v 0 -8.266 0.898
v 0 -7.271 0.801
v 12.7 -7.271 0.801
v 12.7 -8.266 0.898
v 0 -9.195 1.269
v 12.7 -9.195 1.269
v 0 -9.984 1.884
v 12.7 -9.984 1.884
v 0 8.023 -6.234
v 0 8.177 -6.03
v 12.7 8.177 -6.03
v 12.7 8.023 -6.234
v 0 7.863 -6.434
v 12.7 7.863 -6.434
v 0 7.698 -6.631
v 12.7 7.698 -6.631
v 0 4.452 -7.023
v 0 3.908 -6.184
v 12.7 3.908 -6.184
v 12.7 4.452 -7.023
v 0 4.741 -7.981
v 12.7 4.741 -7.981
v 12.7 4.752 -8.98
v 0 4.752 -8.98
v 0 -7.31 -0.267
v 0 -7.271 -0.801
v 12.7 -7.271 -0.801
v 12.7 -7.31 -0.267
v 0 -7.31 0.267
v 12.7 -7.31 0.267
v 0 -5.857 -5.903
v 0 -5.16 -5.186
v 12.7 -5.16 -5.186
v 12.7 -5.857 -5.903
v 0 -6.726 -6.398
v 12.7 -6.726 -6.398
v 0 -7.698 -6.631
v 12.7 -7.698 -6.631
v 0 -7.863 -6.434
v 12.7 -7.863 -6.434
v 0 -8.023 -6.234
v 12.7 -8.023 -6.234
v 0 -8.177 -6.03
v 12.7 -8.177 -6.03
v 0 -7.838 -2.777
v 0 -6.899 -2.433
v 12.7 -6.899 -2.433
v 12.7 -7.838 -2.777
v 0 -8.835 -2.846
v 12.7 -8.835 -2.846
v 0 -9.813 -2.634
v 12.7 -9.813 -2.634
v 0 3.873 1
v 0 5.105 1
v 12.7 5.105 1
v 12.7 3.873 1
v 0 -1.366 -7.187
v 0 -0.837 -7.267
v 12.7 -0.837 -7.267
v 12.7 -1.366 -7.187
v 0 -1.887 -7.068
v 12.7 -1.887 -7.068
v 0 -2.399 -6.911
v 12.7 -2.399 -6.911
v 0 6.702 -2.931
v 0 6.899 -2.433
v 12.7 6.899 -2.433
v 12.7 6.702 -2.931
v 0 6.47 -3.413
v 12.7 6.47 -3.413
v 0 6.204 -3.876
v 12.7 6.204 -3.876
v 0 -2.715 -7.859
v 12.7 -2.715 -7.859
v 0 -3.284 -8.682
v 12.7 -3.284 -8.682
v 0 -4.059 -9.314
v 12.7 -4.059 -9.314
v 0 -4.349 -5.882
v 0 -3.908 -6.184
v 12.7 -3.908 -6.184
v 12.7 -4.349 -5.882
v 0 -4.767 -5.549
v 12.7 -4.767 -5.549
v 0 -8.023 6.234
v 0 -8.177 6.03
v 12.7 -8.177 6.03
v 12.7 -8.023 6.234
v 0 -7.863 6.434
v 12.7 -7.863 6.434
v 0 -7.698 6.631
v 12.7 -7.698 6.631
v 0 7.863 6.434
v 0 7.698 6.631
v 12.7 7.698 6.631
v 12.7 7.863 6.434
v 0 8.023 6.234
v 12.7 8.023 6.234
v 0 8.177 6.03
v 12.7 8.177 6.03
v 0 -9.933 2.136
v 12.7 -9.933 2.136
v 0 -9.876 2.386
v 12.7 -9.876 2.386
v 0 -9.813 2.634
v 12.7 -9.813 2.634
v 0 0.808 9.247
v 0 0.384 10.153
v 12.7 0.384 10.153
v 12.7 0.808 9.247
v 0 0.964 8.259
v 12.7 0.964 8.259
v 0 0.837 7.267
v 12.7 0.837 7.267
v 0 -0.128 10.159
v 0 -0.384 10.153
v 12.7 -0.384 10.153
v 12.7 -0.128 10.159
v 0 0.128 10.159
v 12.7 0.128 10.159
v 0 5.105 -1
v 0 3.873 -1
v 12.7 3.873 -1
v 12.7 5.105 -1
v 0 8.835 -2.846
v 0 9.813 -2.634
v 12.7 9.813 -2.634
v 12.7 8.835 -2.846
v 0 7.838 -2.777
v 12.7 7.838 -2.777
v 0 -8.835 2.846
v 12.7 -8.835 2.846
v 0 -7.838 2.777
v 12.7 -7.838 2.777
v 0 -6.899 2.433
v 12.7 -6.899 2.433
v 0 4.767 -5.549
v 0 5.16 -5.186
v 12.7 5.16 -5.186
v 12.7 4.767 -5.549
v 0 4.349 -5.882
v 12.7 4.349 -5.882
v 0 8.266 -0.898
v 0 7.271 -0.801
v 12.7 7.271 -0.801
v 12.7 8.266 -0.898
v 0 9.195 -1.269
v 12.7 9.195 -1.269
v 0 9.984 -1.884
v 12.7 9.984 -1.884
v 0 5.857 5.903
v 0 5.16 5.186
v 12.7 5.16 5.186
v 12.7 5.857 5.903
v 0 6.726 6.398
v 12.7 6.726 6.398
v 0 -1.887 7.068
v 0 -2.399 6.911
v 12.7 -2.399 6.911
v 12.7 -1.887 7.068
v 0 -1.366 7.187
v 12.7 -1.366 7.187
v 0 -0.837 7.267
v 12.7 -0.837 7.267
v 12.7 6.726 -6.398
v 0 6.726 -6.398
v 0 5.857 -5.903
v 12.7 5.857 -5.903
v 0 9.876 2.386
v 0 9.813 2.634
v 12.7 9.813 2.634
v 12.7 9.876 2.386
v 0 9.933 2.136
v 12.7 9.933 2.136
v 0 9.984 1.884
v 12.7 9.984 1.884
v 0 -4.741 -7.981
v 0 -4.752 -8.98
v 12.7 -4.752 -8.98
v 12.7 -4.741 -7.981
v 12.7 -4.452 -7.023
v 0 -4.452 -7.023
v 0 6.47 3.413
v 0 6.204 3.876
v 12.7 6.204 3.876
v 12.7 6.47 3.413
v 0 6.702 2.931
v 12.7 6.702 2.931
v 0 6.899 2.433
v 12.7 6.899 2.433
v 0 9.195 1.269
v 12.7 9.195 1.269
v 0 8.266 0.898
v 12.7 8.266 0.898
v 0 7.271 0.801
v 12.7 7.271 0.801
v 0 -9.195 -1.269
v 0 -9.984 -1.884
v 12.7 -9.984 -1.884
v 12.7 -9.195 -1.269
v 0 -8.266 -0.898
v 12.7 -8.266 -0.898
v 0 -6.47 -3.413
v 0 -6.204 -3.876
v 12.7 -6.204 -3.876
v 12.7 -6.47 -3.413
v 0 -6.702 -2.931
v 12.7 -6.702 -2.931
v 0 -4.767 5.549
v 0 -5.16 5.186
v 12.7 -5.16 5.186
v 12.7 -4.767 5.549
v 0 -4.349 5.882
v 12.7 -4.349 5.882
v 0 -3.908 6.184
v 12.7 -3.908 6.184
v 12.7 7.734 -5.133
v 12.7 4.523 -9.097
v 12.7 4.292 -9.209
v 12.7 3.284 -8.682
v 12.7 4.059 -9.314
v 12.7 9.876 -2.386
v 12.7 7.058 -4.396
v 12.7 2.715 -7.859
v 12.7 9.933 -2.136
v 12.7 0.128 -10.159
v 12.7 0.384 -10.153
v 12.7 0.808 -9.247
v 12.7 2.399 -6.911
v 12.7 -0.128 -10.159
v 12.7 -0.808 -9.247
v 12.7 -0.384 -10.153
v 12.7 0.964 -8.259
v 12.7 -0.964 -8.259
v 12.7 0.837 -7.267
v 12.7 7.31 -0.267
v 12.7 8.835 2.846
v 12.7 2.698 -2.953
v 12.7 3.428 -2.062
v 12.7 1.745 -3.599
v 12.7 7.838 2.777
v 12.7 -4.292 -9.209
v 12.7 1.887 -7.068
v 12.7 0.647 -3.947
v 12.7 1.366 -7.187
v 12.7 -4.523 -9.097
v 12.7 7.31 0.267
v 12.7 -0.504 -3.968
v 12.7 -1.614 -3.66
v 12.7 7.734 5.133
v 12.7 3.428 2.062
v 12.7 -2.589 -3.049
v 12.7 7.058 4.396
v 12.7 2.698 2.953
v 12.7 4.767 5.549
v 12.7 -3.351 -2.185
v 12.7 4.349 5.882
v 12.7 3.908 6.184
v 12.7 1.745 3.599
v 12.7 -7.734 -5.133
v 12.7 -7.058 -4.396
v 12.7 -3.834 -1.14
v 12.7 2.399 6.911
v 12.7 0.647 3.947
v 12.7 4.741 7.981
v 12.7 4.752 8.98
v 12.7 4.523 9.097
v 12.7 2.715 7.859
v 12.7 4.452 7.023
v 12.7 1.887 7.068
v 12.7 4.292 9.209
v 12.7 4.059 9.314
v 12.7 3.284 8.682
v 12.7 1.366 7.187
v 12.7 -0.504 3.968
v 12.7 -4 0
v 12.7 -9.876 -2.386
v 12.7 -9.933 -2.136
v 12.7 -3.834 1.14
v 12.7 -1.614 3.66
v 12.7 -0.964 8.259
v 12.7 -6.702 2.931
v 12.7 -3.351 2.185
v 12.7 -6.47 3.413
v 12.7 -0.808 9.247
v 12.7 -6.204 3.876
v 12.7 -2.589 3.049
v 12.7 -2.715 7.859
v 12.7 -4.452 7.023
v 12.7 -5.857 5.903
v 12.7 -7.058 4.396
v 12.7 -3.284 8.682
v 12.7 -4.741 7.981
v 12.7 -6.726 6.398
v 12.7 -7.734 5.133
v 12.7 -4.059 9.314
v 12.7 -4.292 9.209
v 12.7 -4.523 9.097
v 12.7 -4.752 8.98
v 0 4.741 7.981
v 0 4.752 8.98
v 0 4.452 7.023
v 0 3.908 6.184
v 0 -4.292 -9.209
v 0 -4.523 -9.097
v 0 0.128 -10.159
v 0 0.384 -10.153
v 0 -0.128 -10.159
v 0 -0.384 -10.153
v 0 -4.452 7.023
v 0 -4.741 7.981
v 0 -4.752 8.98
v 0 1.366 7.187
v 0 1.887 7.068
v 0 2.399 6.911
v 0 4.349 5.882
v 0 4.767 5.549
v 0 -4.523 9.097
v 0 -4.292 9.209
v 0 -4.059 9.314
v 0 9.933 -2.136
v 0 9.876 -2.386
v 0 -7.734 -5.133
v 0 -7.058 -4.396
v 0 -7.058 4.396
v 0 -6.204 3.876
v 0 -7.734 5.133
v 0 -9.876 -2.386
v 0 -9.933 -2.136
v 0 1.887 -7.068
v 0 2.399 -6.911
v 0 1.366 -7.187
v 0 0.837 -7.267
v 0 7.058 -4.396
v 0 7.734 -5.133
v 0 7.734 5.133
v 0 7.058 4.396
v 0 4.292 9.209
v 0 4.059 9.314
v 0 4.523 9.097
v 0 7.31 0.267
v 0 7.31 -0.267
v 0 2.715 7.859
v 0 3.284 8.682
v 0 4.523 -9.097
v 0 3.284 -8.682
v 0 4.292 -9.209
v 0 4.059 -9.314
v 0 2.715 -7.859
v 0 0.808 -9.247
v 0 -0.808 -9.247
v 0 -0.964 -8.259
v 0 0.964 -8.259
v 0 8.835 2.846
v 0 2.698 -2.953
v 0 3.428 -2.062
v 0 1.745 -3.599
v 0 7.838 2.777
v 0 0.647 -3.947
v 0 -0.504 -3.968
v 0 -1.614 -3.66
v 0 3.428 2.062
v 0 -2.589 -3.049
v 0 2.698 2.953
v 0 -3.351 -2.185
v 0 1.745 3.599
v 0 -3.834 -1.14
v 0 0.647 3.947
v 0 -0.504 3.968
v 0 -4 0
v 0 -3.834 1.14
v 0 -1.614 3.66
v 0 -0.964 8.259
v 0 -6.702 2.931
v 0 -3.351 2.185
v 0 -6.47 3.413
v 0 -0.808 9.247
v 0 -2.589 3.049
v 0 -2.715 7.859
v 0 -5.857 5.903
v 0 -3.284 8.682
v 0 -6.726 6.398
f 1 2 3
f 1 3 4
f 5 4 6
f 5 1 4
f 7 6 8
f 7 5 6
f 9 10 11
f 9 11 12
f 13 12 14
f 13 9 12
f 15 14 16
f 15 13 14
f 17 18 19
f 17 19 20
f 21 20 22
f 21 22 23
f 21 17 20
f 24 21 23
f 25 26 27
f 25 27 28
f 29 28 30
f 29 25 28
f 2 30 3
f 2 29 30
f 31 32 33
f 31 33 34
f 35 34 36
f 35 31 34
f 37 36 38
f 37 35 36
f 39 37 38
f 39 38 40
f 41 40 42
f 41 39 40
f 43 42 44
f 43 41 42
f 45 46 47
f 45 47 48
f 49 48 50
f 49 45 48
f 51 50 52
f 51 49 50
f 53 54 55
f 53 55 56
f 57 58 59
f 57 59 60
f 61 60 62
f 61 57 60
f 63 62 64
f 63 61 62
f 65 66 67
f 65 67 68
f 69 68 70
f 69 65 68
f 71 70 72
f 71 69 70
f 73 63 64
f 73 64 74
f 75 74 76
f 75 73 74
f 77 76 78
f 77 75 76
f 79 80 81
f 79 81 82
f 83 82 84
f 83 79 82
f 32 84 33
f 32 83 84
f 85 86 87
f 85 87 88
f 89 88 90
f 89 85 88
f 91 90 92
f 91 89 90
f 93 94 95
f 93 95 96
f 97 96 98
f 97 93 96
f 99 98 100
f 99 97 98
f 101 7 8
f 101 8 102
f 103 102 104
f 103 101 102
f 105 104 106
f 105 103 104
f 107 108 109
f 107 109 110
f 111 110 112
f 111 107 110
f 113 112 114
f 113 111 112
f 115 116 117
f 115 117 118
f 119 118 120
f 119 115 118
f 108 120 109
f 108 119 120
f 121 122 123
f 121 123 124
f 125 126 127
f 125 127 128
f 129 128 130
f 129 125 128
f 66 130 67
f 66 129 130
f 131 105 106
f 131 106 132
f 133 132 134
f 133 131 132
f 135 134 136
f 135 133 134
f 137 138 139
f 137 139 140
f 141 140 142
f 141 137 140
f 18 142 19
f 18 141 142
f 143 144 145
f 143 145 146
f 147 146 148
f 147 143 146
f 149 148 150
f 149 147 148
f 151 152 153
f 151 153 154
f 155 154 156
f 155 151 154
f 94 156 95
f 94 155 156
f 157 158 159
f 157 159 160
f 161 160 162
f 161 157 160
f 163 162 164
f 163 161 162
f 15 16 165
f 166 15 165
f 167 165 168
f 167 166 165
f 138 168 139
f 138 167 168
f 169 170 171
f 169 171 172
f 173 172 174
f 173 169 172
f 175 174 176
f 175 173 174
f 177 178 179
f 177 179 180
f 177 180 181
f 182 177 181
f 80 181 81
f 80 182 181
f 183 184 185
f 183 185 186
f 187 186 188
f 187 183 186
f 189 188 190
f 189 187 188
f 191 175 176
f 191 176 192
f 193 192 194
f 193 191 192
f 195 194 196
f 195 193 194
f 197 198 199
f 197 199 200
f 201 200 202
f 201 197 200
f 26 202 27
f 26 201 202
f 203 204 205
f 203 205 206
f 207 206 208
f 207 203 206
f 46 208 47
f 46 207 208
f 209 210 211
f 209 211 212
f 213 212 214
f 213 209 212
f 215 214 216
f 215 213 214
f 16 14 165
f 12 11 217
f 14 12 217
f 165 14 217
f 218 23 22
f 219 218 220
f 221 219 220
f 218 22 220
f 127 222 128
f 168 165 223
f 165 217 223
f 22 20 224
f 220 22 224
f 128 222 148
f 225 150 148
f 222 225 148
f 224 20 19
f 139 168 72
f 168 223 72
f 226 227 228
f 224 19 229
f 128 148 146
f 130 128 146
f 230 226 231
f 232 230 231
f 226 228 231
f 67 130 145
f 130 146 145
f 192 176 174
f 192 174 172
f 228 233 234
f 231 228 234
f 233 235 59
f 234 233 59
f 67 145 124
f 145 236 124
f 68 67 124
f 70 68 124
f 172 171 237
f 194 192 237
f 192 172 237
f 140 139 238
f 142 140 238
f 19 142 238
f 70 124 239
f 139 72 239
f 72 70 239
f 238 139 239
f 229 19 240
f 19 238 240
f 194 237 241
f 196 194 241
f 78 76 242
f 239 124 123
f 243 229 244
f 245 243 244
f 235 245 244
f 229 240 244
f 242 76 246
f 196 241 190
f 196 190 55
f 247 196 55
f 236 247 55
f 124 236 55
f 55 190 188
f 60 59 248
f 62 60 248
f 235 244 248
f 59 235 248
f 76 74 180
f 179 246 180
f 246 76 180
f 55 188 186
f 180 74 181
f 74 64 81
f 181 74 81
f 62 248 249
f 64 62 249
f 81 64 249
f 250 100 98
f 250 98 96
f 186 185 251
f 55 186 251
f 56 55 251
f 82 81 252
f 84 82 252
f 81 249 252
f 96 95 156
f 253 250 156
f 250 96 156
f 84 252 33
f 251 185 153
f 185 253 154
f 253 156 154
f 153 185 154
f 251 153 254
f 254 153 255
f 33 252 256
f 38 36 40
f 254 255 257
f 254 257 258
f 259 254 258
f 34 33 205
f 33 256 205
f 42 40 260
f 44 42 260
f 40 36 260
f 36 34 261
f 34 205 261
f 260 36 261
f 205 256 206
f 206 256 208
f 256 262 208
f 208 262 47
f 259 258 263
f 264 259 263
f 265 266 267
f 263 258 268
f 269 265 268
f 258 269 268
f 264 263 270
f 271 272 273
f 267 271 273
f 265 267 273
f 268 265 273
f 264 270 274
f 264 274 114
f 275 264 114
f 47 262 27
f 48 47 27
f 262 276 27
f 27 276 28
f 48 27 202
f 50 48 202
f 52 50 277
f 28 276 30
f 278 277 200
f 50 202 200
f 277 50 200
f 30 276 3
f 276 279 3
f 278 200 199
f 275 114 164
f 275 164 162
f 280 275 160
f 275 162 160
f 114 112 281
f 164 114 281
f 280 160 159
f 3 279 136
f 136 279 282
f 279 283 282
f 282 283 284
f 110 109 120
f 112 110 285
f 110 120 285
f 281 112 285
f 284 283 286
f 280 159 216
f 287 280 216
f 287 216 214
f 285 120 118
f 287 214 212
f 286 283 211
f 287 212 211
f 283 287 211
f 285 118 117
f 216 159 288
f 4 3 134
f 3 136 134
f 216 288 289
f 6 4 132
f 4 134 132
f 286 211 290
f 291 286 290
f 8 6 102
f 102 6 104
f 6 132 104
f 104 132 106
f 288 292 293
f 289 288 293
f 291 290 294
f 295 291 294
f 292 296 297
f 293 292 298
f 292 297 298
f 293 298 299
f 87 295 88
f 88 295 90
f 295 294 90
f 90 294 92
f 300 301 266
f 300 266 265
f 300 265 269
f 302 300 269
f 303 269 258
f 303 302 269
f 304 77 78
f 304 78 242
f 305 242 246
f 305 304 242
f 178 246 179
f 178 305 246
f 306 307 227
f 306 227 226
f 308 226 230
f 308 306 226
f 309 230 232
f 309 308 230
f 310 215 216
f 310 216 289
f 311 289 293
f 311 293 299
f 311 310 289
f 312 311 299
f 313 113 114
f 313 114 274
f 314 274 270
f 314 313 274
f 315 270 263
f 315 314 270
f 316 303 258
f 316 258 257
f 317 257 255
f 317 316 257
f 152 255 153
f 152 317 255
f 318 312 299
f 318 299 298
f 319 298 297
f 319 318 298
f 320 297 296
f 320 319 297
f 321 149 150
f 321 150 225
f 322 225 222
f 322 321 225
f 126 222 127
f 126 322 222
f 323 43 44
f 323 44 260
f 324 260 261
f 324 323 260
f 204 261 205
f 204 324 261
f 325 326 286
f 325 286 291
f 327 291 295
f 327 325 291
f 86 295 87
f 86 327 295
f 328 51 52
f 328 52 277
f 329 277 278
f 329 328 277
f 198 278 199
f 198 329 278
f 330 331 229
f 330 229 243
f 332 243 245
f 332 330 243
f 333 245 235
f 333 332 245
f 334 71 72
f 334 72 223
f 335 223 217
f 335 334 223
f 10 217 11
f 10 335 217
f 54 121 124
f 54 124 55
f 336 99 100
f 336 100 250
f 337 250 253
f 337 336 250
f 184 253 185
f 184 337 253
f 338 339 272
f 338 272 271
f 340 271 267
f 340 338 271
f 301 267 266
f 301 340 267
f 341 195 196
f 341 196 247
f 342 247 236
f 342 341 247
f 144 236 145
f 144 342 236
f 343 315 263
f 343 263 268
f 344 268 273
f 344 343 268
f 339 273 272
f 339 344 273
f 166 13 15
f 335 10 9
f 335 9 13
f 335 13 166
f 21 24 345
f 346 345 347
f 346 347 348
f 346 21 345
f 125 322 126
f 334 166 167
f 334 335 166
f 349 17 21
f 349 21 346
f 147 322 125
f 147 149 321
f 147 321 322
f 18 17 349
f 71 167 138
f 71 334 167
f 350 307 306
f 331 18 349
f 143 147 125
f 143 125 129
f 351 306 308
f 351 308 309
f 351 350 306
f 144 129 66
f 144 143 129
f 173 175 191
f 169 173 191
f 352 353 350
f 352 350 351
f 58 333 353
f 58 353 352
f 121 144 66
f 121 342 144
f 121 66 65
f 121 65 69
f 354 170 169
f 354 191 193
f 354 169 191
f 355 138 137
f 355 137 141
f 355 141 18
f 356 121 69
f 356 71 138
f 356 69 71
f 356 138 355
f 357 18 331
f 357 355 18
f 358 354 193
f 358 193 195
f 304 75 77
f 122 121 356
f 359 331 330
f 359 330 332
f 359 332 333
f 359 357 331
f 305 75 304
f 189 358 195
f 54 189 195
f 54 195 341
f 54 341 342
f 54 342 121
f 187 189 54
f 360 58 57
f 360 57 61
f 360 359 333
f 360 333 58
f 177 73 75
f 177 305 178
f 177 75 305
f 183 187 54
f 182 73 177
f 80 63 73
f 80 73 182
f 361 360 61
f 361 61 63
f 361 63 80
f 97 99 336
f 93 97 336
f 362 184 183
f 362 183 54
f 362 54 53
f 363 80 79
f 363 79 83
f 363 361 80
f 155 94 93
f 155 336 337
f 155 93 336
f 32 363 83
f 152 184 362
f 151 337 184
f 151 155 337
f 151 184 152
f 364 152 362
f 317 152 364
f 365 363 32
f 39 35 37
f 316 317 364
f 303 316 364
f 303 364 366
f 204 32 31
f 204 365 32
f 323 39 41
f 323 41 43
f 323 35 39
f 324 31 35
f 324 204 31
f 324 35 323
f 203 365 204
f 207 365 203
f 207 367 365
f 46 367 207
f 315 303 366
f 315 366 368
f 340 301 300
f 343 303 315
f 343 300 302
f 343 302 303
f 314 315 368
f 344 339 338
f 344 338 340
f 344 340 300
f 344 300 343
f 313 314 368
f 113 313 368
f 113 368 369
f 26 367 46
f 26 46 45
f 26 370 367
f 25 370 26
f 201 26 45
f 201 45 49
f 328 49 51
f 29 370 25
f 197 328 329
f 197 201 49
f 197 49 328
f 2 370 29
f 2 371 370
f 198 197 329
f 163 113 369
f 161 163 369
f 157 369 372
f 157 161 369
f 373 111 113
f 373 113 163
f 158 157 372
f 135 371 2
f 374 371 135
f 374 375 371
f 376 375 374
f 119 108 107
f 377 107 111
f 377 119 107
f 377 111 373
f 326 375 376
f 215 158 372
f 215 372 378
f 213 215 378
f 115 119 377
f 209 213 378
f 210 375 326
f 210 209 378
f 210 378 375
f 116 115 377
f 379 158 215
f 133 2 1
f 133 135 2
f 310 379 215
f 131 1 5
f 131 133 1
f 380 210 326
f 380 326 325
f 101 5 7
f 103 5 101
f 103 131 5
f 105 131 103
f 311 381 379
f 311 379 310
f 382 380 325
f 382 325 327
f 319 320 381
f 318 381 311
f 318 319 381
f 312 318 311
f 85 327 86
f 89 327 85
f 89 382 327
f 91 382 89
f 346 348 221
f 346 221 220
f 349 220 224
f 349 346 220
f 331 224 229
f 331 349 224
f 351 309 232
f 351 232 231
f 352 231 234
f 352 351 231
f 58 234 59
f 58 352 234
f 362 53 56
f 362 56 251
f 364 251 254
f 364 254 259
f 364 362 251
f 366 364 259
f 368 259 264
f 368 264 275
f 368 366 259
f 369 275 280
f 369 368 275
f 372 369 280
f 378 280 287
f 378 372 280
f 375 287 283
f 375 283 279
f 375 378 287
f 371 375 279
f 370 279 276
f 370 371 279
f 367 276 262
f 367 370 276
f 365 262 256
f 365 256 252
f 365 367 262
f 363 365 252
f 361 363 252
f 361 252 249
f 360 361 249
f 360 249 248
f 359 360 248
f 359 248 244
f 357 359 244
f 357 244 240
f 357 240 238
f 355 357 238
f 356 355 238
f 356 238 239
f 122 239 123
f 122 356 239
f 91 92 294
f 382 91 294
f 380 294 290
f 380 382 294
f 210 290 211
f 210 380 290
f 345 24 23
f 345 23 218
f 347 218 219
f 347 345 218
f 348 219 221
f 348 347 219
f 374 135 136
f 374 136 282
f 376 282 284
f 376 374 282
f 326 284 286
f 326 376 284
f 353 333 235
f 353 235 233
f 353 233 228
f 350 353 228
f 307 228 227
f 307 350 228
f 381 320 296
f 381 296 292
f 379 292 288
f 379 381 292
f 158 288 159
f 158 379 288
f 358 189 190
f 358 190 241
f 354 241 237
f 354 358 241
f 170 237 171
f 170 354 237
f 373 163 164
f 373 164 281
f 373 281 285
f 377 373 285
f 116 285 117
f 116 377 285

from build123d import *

# Parameters (mm, degrees)
BOSS_EXTRUDE1_DEPTH = 12.7


with BuildPart() as part:
    # Sketch1 → Boss-Extrude1 (new body)
    with BuildSketch(Plane(origin=(0, 0, 0), x_dir=(0, -1, 0), z_dir=(-1, 0, 0))):
        with BuildLine():
            ThreePointArc((-8.177440487, -6.029516323), (-7.943407862, -6.334656387), (-7.697995454, -6.630721377))
            ThreePointArc((-7.697995454, -6.630721377), (-6.273562142, -6.180849316), (-5.15957287, -5.185649317))
            ThreePointArc((-5.15957287, -5.185649317), (-4.560952599, -5.719253661), (-3.907521288, -6.184127135))
            ThreePointArc((-3.907521288, -6.184127135), (-4.629883612, -7.491639203), (-4.75151021, -8.98046495))
            ThreePointArc((-4.75151021, -8.98046495), (-4.408258789, -9.153843698), (-4.058692066, -9.314108584))
            ThreePointArc((-4.058692066, -9.314108584), (-2.970514168, -8.29074941), (-2.398645612, -6.910763363))
            ThreePointArc((-2.398645612, -6.910763363), (-1.627785136, -7.131792663), (-0.837362826, -7.267115971))
            ThreePointArc((-0.837362826, -7.267115971), (-0.920880567, -8.758564905), (-0.384485064, -10.152722356))
            ThreePointArc((-0.384485064, -10.152722356), (0, -10.16), (0.384485064, -10.152722356))
            ThreePointArc((0.384485064, -10.152722356), (0.920880567, -8.758564905), (0.837362826, -7.267115971))
            ThreePointArc((0.837362826, -7.267115971), (1.627785136, -7.131792663), (2.398645612, -6.910763363))
            ThreePointArc((2.398645612, -6.910763363), (2.970514168, -8.29074941), (4.058692066, -9.314108584))
            ThreePointArc((4.058692066, -9.314108584), (4.408258789, -9.153843698), (4.75151021, -8.98046495))
            ThreePointArc((4.75151021, -8.98046495), (4.629883612, -7.491639203), (3.907521288, -6.184127135))
            ThreePointArc((3.907521288, -6.184127135), (4.560952599, -5.719253661), (5.15957287, -5.185649317))
            ThreePointArc((5.15957287, -5.185649317), (6.273562142, -6.180849316), (7.697995454, -6.630721377))
            ThreePointArc((7.697995454, -6.630721377), (7.943407862, -6.334656387), (8.177440487, -6.029516323))
            ThreePointArc((8.177440487, -6.029516323), (7.421881426, -4.740902478), (6.203747236, -3.876296077))
            ThreePointArc((6.203747236, -3.876296077), (6.590767462, -3.173946328), (6.898583443, -2.433453825))
            ThreePointArc((6.898583443, -2.433453825), (8.334054192, -2.846756211), (9.812616434, -2.634038481))
            ThreePointArc((9.812616434, -2.634038481), (9.905267588, -2.260812689), (9.983728385, -1.884348041))
            ThreePointArc((9.983728385, -1.884348041), (8.7438846, -1.051171874), (7.271244959, -0.800717041))
            ThreePointArc((7.271244959, -0.800717041), (7.3152, 0), (7.271244959, 0.800717041))
            ThreePointArc((7.271244959, 0.800717041), (8.7438846, 1.051171874), (9.983728385, 1.884348041))
            ThreePointArc((9.983728385, 1.884348041), (9.905267588, 2.260812689), (9.812616434, 2.634038481))
            ThreePointArc((9.812616434, 2.634038481), (8.334054192, 2.846756211), (6.898583443, 2.433453825))
            ThreePointArc((6.898583443, 2.433453825), (6.590767462, 3.173946328), (6.203747236, 3.876296077))
            ThreePointArc((6.203747236, 3.876296077), (7.421881426, 4.740902478), (8.177440487, 6.029516323))
            ThreePointArc((8.177440487, 6.029516323), (7.943407862, 6.334656387), (7.697995454, 6.630721377))
            ThreePointArc((7.697995454, 6.630721377), (6.273562142, 6.180849316), (5.15957287, 5.185649317))
            ThreePointArc((5.15957287, 5.185649317), (4.560952599, 5.719253661), (3.907521288, 6.184127135))
            ThreePointArc((3.907521288, 6.184127135), (4.629883612, 7.491639203), (4.75151021, 8.98046495))
            ThreePointArc((4.75151021, 8.98046495), (4.408258789, 9.153843698), (4.058692066, 9.314108584))
            ThreePointArc((4.058692066, 9.314108584), (2.970514168, 8.29074941), (2.398645612, 6.910763363))
            ThreePointArc((2.398645612, 6.910763363), (1.627785136, 7.131792663), (0.837362826, 7.267115971))
            ThreePointArc((0.837362826, 7.267115971), (0.920880567, 8.758564905), (0.384485064, 10.152722356))
            ThreePointArc((0.384485064, 10.152722356), (0, 10.16), (-0.384485064, 10.152722356))
            ThreePointArc((-0.384485064, 10.152722356), (-0.920880567, 8.758564905), (-0.837362826, 7.267115971))
            ThreePointArc((-0.837362826, 7.267115971), (-1.627785136, 7.131792663), (-2.398645612, 6.910763363))
            ThreePointArc((-2.398645612, 6.910763363), (-2.970514168, 8.29074941), (-4.058692066, 9.314108584))
            ThreePointArc((-4.058692066, 9.314108584), (-4.408258789, 9.153843698), (-4.75151021, 8.98046495))
            ThreePointArc((-4.75151021, 8.98046495), (-4.629883612, 7.491639203), (-3.907521288, 6.184127135))
            ThreePointArc((-3.907521288, 6.184127135), (-4.560952599, 5.719253661), (-5.15957287, 5.185649317))
            ThreePointArc((-5.15957287, 5.185649317), (-6.273562142, 6.180849316), (-7.697995454, 6.630721377))
            ThreePointArc((-7.697995454, 6.630721377), (-7.943407862, 6.334656387), (-8.177440487, 6.029516323))
            ThreePointArc((-8.177440487, 6.029516323), (-7.421881426, 4.740902478), (-6.203747236, 3.876296077))
            ThreePointArc((-6.203747236, 3.876296077), (-6.590767462, 3.173946328), (-6.898583443, 2.433453825))
            ThreePointArc((-6.898583443, 2.433453825), (-8.334054192, 2.846756211), (-9.812616434, 2.634038481))
            ThreePointArc((-9.812616434, 2.634038481), (-9.905267588, 2.260812689), (-9.983728385, 1.884348041))
            ThreePointArc((-9.983728385, 1.884348041), (-8.7438846, 1.051171874), (-7.271244959, 0.800717041))
            ThreePointArc((-7.271244959, 0.800717041), (-7.3152, 0), (-7.271244959, -0.800717041))
            ThreePointArc((-7.271244959, -0.800717041), (-8.7438846, -1.051171874), (-9.983728385, -1.884348041))
            ThreePointArc((-9.983728385, -1.884348041), (-9.905267588, -2.260812689), (-9.812616434, -2.634038481))
            ThreePointArc((-9.812616434, -2.634038481), (-8.334054192, -2.846756211), (-6.898583443, -2.433453825))
            ThreePointArc((-6.898583443, -2.433453825), (-6.590767462, -3.173946328), (-6.203747236, -3.876296077))
            ThreePointArc((-6.203747236, -3.876296077), (-7.421881426, -4.740902478), (-8.177440487, -6.029516323))
        make_face()
        with BuildLine():
            Line((-5.1054, 1), (-3.872983346, 1))
            ThreePointArc((-3.872983346, 1), (4, 0), (-3.872983346, -1))
            Line((-3.872983346, -1), (-5.1054, -1))
            Line((-5.1054, -1), (-5.1054, 1))
        make_face(mode=Mode.SUBTRACT)
    extrude(amount=-BOSS_EXTRUDE1_DEPTH)


solid = part.part
